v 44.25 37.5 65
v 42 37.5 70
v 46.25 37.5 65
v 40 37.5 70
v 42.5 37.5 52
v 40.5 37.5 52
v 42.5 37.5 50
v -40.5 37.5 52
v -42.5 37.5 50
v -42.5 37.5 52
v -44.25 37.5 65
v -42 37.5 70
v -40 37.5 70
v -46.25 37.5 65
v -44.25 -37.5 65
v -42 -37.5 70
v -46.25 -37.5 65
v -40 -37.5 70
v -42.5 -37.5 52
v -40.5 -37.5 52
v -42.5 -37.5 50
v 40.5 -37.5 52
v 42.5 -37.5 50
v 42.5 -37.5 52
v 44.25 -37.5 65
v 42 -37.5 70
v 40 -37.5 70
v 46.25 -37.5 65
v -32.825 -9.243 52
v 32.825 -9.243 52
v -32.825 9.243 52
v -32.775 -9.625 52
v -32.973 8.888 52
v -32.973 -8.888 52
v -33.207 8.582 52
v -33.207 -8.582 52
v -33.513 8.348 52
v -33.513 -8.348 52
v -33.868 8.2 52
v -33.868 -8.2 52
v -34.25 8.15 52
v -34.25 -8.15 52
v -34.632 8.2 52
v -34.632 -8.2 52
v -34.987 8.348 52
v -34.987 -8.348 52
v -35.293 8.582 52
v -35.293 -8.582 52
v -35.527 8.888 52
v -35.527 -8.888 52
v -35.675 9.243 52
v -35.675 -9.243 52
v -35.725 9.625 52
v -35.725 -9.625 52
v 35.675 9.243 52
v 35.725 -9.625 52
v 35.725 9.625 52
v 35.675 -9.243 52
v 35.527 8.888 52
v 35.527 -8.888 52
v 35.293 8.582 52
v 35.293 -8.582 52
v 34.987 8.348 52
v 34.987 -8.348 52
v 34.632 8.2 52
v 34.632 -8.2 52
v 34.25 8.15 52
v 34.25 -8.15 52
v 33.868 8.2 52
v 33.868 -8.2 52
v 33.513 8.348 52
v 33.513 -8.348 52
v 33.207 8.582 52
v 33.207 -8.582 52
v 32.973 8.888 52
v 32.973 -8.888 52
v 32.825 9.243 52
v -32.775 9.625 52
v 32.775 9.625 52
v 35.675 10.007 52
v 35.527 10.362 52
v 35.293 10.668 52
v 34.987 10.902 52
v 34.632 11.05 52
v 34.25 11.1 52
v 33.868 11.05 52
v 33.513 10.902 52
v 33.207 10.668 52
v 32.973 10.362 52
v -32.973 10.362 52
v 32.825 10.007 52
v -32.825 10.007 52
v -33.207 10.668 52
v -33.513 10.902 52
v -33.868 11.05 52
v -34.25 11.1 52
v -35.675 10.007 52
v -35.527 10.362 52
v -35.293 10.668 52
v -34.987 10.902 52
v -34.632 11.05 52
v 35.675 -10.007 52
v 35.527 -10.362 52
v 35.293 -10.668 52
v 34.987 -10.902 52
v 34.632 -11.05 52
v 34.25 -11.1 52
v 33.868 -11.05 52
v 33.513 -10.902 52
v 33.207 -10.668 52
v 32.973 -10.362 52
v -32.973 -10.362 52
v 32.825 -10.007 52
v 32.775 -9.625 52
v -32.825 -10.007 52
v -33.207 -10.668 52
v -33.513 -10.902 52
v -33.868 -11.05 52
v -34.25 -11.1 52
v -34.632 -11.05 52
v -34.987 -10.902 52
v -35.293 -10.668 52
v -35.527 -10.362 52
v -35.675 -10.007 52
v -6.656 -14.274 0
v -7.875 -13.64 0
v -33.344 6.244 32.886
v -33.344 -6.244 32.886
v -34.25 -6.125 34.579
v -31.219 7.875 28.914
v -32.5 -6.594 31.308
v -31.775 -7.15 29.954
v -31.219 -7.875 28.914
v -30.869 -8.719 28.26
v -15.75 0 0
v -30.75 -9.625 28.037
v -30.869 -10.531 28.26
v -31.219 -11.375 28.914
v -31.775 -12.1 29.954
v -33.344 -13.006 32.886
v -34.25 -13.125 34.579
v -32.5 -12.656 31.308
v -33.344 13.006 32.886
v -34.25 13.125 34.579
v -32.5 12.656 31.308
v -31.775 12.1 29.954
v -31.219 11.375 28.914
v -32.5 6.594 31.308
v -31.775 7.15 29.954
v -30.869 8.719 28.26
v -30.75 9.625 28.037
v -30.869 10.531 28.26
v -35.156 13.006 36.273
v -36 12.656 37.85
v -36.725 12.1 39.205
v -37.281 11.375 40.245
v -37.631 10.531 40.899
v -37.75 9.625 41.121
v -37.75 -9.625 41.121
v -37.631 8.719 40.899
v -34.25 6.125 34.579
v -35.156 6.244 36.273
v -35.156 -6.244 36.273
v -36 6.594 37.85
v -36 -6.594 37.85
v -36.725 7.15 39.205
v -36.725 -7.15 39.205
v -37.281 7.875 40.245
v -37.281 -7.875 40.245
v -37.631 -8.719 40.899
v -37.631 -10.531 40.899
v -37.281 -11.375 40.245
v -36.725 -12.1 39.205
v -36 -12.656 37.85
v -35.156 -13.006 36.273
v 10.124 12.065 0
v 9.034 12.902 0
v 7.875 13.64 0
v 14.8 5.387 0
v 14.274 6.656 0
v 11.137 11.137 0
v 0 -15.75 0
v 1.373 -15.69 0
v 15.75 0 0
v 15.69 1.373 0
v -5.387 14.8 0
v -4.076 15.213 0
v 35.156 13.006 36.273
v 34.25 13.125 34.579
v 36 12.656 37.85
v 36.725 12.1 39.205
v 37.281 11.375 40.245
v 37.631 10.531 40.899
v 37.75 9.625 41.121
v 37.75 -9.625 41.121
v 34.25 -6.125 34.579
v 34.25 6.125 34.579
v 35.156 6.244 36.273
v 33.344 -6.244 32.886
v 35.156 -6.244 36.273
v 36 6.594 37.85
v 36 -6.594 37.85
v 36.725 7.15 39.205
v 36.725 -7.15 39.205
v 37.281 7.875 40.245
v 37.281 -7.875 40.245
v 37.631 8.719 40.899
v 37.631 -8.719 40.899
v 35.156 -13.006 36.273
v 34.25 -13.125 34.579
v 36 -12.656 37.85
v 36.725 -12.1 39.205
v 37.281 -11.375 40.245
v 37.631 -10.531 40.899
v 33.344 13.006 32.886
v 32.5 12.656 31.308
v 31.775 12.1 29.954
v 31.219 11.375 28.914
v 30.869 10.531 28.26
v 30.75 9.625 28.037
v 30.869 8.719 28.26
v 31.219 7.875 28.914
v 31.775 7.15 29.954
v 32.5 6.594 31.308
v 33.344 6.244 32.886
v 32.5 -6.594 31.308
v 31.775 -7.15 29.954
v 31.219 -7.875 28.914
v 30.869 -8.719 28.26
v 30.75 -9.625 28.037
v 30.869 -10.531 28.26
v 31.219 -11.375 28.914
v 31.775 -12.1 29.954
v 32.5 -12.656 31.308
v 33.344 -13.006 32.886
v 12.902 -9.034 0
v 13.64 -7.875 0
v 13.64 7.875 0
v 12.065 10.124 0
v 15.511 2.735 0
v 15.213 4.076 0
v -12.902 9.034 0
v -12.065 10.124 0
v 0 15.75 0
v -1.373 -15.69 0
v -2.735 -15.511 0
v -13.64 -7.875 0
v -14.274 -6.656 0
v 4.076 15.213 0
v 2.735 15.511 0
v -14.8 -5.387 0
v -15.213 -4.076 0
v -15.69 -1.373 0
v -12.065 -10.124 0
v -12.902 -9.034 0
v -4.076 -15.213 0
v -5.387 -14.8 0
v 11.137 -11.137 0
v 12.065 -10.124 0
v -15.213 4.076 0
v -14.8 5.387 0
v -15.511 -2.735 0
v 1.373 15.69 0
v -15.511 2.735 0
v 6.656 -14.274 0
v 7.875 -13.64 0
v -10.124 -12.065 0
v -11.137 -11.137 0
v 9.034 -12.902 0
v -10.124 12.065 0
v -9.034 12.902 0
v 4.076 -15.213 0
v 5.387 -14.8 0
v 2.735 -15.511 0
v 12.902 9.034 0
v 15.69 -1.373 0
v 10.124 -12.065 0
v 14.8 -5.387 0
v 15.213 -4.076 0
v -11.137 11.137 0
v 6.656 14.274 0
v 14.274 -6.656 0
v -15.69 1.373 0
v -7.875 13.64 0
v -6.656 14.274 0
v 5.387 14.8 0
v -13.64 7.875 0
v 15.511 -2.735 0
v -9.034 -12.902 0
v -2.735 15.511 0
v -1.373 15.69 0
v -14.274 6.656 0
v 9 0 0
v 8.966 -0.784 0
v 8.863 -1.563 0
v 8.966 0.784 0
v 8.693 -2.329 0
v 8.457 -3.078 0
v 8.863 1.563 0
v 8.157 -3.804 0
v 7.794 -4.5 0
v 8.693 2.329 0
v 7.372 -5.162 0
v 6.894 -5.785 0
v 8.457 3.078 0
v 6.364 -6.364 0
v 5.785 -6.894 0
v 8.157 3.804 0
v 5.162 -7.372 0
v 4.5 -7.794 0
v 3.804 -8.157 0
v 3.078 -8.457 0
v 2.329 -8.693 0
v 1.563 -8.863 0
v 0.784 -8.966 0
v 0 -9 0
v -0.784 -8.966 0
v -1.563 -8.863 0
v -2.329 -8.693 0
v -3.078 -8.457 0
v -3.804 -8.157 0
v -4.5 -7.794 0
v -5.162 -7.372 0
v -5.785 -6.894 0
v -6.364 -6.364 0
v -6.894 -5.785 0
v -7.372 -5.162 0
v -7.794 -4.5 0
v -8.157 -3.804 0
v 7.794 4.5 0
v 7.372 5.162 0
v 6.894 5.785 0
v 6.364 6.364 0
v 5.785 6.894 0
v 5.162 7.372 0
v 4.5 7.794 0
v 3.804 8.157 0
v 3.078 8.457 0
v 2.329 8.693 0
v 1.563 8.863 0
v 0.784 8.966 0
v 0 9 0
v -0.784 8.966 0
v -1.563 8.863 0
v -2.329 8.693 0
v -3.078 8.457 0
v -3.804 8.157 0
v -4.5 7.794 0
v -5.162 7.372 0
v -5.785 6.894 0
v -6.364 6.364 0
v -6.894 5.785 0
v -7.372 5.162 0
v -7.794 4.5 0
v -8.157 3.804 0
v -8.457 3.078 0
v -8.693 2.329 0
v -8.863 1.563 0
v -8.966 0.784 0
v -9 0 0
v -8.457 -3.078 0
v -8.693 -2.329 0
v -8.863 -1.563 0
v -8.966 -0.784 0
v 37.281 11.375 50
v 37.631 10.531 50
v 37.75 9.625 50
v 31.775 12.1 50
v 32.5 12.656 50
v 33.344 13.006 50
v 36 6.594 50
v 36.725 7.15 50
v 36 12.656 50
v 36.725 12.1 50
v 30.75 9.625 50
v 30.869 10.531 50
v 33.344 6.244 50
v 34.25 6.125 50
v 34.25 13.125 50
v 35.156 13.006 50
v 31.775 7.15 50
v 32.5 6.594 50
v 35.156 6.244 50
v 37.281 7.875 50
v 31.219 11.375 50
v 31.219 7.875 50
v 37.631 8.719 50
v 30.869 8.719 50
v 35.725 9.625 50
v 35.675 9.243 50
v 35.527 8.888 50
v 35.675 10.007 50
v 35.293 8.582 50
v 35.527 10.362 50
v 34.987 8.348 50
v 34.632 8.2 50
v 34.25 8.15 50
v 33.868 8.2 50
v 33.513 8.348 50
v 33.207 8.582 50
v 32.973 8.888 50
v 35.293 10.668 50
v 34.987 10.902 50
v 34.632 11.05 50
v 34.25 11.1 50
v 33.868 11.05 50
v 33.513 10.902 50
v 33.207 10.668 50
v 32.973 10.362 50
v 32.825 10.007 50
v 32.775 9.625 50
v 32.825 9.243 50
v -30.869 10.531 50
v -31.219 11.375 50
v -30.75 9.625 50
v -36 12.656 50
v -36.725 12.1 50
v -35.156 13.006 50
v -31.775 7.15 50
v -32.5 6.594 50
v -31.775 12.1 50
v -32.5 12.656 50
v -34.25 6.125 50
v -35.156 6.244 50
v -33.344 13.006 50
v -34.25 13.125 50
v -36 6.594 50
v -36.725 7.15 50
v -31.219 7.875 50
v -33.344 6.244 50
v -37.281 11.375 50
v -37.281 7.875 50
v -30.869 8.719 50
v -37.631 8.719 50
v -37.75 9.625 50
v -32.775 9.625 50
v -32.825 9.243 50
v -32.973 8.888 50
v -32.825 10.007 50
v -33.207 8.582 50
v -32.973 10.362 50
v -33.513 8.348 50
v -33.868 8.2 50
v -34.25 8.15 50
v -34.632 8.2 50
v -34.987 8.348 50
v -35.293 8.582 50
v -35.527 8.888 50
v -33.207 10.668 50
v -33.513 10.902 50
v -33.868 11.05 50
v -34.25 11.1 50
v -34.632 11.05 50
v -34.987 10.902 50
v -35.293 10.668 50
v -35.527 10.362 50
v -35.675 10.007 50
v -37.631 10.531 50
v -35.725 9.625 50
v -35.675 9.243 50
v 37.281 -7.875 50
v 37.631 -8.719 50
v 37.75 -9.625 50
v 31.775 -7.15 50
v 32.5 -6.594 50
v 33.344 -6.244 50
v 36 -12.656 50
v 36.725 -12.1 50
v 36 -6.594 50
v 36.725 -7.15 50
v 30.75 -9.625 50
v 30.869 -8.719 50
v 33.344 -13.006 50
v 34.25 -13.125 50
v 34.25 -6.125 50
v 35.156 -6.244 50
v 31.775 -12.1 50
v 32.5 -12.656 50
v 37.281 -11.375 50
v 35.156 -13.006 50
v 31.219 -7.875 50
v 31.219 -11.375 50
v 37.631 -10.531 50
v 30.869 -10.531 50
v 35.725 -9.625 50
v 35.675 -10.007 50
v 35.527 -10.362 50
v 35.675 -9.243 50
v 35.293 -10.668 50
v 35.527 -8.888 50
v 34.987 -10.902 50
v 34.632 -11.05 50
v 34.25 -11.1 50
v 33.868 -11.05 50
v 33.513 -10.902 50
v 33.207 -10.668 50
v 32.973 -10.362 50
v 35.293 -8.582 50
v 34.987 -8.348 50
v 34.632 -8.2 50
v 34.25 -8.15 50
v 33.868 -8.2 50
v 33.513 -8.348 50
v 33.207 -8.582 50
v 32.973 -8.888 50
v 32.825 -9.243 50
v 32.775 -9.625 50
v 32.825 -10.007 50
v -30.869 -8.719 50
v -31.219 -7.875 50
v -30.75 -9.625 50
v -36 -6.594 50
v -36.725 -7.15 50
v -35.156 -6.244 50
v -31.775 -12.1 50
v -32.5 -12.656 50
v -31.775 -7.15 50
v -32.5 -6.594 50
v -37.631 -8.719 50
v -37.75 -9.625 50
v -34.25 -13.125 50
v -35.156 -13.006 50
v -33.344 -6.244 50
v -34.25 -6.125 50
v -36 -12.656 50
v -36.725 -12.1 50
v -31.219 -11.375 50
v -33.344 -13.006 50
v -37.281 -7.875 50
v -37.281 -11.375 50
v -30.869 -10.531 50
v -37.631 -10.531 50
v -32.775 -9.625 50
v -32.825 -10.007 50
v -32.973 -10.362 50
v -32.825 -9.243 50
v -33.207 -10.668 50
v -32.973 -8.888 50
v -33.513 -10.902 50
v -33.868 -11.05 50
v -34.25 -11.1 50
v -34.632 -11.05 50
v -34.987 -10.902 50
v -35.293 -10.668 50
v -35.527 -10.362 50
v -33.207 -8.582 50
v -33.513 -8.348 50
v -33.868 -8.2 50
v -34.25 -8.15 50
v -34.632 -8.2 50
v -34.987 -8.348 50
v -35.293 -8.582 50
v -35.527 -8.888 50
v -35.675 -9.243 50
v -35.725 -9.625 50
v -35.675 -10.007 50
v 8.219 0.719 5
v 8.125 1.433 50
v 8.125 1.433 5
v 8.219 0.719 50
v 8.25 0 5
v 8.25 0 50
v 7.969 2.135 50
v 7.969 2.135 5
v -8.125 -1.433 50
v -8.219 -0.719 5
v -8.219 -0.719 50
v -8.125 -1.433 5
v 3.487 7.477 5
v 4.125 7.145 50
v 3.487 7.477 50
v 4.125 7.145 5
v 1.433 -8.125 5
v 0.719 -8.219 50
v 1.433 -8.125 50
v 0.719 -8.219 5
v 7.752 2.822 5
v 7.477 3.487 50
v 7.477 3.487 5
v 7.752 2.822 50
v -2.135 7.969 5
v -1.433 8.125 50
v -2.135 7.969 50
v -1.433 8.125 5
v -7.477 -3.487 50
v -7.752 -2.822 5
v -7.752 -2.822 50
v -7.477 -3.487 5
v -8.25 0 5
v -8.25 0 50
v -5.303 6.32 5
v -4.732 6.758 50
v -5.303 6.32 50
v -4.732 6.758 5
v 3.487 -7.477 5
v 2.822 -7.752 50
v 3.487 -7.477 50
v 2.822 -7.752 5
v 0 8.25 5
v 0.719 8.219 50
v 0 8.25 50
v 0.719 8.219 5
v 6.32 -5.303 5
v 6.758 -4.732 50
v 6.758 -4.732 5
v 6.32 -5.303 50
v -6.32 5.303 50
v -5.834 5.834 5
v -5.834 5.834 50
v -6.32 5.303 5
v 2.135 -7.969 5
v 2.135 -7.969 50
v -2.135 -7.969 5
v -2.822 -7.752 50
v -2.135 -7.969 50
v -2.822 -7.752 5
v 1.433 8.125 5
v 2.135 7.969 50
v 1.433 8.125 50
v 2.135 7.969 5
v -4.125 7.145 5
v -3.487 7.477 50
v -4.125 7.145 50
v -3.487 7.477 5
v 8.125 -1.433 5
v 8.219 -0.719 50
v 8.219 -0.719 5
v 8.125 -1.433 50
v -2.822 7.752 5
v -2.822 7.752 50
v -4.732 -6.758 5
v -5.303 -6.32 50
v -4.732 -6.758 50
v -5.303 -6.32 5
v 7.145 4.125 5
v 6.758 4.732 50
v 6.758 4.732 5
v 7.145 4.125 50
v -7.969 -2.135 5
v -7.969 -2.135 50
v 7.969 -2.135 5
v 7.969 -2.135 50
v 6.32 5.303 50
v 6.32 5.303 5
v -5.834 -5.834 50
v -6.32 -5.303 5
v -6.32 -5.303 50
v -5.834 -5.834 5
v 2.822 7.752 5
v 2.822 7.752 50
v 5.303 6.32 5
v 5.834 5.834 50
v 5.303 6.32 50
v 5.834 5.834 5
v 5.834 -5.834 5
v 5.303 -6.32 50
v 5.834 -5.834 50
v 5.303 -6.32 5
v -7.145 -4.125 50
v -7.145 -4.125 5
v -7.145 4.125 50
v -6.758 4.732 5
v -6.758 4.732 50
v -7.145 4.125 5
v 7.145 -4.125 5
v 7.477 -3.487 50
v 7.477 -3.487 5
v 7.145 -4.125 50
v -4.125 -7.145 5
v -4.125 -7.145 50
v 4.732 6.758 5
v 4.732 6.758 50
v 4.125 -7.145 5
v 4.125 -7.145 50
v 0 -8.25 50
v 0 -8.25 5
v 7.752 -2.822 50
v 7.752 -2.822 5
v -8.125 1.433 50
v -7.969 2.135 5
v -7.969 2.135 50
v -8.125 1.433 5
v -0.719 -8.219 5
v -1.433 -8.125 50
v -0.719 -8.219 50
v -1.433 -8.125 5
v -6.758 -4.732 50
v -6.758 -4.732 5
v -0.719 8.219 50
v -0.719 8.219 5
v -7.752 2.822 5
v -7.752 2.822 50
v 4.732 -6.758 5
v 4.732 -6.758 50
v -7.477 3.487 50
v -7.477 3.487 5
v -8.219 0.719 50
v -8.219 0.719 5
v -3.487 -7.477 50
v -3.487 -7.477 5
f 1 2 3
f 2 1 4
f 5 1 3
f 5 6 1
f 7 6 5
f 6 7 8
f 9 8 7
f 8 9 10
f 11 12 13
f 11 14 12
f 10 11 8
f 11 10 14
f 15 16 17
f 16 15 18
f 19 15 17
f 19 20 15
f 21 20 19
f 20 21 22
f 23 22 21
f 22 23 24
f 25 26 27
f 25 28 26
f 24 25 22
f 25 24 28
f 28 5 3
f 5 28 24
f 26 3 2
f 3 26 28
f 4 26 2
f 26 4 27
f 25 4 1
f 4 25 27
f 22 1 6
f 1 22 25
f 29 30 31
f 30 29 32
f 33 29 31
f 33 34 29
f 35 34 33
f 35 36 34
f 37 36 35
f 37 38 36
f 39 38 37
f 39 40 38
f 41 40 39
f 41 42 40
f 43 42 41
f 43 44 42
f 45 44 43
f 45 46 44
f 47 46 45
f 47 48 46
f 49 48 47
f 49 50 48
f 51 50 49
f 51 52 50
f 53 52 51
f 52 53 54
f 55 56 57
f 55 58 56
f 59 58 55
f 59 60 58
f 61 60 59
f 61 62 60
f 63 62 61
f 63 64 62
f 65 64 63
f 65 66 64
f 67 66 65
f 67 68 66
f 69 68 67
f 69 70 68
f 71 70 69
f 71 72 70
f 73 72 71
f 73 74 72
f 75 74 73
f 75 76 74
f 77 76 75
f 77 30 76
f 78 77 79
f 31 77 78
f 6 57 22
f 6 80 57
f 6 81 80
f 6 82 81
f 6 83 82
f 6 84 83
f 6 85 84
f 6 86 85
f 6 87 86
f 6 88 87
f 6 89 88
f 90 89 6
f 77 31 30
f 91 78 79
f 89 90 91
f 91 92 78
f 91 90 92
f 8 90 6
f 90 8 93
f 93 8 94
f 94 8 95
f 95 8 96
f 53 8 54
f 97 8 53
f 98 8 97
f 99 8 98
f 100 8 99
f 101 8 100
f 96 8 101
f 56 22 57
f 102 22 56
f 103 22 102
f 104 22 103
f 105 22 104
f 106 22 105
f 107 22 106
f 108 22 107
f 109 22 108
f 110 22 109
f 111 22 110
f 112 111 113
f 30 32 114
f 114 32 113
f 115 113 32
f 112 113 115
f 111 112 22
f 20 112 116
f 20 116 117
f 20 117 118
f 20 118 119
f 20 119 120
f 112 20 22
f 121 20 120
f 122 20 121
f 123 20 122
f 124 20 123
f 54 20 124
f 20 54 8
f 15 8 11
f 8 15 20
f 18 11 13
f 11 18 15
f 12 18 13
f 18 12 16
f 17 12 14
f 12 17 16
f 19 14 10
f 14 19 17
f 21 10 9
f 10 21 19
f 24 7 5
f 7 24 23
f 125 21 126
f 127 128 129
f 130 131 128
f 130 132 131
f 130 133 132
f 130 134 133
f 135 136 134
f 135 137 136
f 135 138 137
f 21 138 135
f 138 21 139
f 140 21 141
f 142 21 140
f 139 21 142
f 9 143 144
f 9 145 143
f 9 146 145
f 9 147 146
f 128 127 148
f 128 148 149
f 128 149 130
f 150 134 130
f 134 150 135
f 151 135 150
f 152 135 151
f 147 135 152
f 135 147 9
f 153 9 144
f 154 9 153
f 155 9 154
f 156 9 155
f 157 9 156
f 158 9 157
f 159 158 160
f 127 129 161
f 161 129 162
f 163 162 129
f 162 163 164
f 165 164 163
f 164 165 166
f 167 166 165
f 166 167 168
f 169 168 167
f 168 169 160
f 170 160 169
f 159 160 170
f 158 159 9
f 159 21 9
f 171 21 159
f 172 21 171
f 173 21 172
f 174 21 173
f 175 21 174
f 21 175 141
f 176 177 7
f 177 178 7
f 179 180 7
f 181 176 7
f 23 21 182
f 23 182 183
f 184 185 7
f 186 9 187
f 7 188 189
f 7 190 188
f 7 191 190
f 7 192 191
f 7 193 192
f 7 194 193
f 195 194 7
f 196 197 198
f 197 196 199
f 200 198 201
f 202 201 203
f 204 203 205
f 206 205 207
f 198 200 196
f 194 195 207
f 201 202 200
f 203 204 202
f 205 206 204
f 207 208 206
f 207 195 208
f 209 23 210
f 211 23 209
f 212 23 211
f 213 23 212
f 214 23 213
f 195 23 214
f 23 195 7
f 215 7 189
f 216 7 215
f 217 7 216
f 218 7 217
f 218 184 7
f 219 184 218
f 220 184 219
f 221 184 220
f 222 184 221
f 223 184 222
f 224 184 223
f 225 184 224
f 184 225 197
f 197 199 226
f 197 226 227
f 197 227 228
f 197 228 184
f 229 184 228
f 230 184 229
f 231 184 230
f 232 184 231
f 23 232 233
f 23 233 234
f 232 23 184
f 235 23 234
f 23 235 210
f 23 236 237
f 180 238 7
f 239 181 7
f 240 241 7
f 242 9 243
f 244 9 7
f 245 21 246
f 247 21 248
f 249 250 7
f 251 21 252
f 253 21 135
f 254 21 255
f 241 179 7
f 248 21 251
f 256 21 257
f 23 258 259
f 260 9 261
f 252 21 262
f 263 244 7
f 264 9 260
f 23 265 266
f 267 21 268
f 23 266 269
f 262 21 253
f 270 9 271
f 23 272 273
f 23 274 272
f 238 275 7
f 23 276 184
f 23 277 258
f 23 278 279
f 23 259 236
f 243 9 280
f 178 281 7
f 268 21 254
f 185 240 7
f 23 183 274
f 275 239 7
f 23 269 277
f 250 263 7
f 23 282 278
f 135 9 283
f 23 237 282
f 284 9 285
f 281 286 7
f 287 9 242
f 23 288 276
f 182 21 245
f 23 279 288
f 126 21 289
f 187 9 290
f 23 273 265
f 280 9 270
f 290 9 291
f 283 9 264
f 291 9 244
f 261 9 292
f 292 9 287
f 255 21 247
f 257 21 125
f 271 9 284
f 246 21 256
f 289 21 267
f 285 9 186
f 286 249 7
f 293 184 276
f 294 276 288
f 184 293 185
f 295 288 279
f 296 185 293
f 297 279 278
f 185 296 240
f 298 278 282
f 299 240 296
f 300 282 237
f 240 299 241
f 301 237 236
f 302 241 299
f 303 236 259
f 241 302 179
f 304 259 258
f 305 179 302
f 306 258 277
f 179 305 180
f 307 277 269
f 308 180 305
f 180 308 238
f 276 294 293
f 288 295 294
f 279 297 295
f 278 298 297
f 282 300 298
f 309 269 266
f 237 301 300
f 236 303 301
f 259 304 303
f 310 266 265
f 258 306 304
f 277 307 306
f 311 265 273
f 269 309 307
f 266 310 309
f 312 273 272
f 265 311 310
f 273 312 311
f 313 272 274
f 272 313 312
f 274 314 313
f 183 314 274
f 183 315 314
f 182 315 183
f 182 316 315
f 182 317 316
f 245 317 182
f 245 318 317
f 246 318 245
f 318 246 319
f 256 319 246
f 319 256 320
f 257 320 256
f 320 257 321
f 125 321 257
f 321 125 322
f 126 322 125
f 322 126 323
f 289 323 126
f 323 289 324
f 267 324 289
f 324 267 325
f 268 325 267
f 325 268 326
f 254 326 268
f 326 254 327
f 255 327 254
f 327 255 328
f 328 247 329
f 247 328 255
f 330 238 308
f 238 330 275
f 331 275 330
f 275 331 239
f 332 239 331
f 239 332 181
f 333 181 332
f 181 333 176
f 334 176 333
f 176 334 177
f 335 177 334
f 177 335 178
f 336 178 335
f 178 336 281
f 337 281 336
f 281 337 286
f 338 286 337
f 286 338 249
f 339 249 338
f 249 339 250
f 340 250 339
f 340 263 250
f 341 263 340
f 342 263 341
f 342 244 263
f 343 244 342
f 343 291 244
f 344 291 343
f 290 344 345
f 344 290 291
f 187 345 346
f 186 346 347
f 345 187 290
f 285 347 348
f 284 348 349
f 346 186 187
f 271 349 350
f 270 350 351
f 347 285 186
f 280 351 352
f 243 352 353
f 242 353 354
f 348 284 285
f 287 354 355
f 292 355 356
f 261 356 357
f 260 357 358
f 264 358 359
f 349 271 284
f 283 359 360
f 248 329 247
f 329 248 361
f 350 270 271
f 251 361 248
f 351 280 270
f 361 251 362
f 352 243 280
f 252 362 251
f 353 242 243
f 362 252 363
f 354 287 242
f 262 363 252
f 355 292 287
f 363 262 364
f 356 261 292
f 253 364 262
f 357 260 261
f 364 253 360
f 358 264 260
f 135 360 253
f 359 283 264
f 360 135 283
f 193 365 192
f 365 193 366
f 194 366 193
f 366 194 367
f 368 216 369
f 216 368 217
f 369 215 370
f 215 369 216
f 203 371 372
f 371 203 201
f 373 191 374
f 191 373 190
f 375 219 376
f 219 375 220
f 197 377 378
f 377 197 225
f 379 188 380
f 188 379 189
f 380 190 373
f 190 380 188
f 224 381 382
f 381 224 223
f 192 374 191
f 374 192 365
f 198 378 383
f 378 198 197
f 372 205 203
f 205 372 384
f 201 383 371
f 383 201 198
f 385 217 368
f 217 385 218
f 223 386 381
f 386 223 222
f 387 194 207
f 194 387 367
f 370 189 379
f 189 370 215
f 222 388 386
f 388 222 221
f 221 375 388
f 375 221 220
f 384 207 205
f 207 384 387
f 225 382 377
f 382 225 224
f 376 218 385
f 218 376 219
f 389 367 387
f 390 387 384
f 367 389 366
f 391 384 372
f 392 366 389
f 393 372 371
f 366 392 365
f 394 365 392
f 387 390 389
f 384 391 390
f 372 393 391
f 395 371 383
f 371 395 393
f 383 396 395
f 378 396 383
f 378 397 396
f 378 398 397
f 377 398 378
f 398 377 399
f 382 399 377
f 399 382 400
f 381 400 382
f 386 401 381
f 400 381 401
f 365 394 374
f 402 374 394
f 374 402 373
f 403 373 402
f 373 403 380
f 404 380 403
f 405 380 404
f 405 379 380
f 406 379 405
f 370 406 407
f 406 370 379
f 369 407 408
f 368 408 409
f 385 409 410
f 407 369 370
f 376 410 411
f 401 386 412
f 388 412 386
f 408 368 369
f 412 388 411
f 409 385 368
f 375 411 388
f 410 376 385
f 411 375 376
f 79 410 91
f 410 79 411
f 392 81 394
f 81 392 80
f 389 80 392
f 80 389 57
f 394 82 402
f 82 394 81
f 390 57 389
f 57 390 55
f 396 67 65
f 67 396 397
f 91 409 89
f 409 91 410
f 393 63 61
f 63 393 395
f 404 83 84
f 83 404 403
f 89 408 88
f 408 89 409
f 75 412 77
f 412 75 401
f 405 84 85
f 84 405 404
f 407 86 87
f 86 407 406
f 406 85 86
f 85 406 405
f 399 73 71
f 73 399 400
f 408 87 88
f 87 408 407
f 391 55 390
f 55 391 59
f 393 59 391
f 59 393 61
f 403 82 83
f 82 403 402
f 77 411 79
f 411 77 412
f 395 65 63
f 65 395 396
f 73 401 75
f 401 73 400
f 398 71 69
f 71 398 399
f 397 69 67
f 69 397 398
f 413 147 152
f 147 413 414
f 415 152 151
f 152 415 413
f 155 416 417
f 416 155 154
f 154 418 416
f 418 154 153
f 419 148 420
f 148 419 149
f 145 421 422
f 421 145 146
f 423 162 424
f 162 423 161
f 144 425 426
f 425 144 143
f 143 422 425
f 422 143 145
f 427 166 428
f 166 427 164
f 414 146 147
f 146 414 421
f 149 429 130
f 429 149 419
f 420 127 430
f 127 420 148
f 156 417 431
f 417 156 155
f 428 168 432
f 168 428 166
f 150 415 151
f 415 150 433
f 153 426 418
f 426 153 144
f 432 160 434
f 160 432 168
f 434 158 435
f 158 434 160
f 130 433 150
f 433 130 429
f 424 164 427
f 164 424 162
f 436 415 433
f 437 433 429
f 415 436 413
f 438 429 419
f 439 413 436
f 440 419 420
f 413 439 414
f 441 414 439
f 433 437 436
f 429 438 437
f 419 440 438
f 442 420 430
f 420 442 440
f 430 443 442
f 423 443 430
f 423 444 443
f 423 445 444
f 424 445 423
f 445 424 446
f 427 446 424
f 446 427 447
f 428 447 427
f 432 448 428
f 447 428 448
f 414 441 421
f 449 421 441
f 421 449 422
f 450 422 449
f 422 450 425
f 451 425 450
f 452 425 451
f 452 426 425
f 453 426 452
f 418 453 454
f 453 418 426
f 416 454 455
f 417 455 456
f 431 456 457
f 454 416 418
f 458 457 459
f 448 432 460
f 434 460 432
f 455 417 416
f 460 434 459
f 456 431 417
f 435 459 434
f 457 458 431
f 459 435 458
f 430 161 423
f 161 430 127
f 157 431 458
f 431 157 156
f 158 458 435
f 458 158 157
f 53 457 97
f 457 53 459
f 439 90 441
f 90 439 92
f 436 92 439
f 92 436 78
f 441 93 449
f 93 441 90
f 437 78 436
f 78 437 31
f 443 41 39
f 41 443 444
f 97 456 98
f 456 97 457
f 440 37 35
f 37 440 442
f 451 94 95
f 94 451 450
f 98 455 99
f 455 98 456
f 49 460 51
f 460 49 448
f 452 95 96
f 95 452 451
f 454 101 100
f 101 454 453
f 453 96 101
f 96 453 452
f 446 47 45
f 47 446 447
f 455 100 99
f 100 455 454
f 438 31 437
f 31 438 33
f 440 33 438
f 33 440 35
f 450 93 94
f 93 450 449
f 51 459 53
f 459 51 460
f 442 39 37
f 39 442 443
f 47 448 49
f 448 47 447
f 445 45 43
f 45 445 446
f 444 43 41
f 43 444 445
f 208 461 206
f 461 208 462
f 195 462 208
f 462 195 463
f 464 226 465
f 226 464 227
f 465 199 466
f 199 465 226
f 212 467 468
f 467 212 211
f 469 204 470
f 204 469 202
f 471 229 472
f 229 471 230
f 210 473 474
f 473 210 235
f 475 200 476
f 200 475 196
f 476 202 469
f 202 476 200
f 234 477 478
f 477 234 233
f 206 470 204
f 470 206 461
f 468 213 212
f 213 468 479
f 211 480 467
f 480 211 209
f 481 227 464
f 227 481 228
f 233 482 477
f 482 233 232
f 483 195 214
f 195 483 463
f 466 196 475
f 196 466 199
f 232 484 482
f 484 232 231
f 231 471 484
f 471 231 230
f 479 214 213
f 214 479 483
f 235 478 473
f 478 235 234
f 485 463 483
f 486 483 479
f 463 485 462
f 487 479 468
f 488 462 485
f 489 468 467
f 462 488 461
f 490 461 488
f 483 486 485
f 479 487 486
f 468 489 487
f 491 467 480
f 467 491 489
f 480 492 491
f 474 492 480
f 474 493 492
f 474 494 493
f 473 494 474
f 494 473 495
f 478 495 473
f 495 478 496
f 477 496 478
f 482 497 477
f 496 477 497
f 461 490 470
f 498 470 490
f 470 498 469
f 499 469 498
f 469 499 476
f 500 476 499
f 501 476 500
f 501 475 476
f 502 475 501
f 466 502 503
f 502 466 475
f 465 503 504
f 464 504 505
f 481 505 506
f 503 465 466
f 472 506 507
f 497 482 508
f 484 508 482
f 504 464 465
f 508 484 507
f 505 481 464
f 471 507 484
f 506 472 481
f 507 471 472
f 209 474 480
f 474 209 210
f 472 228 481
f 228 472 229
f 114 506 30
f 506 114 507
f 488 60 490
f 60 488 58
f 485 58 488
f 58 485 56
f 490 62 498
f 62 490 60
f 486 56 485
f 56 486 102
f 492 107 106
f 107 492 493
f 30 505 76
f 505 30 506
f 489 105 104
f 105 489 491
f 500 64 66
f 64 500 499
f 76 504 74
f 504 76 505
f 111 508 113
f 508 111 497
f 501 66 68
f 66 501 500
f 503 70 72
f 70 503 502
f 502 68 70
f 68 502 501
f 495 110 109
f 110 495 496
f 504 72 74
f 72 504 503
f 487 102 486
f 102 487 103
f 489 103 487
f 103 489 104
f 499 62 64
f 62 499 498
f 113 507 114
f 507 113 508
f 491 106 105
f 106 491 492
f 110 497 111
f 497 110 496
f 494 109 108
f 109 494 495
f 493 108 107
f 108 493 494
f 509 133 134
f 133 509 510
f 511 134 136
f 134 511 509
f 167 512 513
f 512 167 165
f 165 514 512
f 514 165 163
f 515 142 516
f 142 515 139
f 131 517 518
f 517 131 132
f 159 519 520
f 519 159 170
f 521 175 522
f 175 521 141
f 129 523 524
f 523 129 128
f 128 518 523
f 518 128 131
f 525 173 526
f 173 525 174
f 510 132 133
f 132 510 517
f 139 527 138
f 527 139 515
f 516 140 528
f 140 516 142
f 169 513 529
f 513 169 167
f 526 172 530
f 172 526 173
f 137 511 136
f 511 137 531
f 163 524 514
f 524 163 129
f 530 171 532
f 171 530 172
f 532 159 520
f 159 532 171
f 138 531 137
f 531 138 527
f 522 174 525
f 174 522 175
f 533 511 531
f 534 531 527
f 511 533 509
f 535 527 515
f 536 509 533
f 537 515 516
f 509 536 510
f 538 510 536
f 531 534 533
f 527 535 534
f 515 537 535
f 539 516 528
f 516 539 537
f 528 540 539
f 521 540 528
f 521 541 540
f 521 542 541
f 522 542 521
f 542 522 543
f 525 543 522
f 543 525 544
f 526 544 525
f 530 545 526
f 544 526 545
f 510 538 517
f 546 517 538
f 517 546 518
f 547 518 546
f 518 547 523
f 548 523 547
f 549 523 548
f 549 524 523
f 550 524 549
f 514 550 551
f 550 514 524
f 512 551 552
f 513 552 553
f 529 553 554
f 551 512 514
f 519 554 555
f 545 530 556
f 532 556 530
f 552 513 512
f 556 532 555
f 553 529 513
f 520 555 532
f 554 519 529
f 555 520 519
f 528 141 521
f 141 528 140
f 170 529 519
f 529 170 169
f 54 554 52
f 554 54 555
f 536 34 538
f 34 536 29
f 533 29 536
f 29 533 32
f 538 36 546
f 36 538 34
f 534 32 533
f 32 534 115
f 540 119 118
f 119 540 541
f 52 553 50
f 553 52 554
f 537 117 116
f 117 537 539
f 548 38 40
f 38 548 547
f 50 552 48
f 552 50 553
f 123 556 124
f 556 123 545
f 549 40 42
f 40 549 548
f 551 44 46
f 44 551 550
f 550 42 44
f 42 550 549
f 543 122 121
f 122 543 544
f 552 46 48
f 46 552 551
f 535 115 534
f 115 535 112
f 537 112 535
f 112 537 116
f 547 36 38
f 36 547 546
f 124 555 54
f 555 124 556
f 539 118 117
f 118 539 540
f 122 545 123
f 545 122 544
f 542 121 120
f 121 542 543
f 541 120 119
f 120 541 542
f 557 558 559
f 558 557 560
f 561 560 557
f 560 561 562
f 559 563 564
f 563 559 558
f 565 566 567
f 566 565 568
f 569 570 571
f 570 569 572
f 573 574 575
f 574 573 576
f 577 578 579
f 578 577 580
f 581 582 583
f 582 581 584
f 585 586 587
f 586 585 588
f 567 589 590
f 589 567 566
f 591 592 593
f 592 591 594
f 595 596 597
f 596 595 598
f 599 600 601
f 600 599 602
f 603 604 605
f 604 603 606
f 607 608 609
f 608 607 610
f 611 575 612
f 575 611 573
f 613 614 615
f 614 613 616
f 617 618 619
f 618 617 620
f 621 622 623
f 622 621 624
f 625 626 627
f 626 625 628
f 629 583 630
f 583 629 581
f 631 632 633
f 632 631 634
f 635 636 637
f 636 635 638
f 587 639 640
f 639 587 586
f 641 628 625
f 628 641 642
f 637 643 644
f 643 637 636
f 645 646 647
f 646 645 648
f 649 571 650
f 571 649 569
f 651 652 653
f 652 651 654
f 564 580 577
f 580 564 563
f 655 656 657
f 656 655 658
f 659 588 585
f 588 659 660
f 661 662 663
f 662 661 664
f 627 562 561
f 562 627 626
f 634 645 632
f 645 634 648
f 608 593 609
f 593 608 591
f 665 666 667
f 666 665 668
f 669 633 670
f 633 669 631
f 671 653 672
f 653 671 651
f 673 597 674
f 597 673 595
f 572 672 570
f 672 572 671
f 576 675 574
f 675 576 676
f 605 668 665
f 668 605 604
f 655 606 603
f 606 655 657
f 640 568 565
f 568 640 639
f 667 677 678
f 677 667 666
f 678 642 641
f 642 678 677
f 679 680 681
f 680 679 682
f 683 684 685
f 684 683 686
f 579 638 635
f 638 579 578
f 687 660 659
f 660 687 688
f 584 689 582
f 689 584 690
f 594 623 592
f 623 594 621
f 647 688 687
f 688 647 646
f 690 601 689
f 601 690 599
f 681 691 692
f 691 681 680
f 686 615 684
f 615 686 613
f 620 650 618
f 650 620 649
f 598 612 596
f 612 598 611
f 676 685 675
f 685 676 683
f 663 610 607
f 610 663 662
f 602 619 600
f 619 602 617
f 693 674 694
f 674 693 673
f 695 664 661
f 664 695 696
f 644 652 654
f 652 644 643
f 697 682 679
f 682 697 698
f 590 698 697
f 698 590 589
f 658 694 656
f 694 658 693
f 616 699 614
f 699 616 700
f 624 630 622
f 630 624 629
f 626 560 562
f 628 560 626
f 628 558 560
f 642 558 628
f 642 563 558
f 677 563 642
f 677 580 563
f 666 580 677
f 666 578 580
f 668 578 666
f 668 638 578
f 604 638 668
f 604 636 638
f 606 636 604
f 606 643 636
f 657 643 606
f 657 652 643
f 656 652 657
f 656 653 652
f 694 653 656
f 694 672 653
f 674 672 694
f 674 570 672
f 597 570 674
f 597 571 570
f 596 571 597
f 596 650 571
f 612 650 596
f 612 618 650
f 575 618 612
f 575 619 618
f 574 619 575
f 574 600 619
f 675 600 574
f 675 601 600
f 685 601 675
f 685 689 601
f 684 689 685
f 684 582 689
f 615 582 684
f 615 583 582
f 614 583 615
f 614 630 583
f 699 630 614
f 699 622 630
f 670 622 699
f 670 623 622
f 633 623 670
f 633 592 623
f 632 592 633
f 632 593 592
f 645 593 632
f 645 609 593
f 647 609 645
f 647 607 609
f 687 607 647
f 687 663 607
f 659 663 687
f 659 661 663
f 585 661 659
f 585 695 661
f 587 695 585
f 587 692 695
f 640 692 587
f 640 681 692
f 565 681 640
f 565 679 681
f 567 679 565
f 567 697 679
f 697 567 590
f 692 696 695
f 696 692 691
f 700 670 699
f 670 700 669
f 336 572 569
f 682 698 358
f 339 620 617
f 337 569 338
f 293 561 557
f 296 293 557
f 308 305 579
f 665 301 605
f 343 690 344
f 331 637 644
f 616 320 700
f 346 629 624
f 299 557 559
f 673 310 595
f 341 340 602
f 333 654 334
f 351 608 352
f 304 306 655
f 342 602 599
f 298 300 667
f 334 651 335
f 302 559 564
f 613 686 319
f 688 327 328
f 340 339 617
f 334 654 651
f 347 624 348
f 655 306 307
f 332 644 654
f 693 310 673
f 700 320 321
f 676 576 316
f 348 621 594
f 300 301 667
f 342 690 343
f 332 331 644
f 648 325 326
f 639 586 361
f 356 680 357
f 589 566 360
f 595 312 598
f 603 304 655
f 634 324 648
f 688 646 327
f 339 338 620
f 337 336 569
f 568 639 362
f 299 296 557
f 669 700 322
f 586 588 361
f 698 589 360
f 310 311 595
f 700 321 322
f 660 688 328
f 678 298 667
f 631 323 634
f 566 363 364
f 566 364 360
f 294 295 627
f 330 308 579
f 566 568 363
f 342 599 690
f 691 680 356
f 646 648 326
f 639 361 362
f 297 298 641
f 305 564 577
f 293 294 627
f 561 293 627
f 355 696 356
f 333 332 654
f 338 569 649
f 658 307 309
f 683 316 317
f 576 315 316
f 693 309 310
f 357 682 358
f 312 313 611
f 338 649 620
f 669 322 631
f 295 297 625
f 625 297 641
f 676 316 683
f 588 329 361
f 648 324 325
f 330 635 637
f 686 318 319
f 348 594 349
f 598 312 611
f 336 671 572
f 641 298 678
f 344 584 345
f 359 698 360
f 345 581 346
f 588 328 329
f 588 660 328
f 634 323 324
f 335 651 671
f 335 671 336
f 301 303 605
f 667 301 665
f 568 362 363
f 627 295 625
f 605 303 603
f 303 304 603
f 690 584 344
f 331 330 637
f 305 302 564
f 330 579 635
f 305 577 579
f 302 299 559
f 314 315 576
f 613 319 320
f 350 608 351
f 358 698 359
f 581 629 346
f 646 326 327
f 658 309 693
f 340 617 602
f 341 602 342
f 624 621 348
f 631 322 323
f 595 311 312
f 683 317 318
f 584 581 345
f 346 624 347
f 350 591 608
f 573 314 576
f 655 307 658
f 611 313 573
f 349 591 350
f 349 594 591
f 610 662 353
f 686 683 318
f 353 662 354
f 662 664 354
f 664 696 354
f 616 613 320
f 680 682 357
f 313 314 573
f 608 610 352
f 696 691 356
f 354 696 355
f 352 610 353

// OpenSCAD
// file: measurements.scad
// The thickness of any walls (e.g. the difference between the inner and outer radiuses of a tube retainer).
thickness_mm = 7.5;

// The tube which spaces apart the VESA mount and the Kinect mount.
////////////////////////////////////////////////////////////////////////////////

// The diameter of the narrowest part of the tube's retainer.
tube_retainer_diameter_mm = 16.5;

// The total length of the tube's retainer.
tube_retainer_length_mm = 50;

// The diameter of the widest part of the tube's retainer.
tube_feed_diameter_mm = 18;

// The length of the transition between the widest and narrowest parts of the
// tube's retainer.
tube_feed_length_mm = 5;

// The number of sides on the tube's retainer.
tube_sides = 72;

// Additional radius added where a tube mounting meets a surface.
tube_widening_mm = 10;

// Kinect for Xbox 360.
////////////////////////////////////////////////////////////////////////////////

// The length of the Kinect's base.
kinect_length_mm = 75;

// The width of the bottom of the Kinect's base.
kinect_lower_width_mm = 81;

// The thickness of the base below the Kinect.
kinect_base_height_mm = 2;

// The width of the middle of the Kinect's base (its widest point).
kinect_middle_width_mm = 88.5;

// The distance between the bottom of the Kinect's base and its widest point.
kinect_lower_height_mm = 13;

// The width of the top of the Kinect's base.
kinect_top_width_mm = 80;

// The distance between the widest point of the Kinect's base and the top of the
// retainer.
kinect_upper_height_mm = 5;

// The thickness of the Kinect's retainer.
kinect_clip_thickness_mm = 2;

// The diameter of the head of the M3 screw used to secure the Kinect.
kinect_screw_head_diameter_mm = 7;

// The diameter of the hole required by the M3 screw used to secure the Kinect.
kinect_screw_hole_diameter_mm = 2.95;

// The number of sides of the head of or the hole required by the M3 screw used
// to secure the Kinect.
kinect_screw_sides = 24;

// The distance between the Kinect's front and back screw holes.
kinect_screw_y_spacing_mm = 19.25;

// The distance between the Kinect's left and right screw holes.
kinect_screw_x_spacing_mm = 68.5;

// The space which must be clear behind a Kinect for cable routing.
kinect_cable_spacing_mm = 15;

// The MALM push-fit bracket.
////////////////////////////////////////////////////////////////////////////////

// The thickness of the desk.
malm_height_mm = 50.5;

// The length of the fingers which push onto the desk.  Increase to improve
// pitch stability.
malm_length_mm = 70;

// The width of the fingers which push onto the desk.  Increase to improve roll
// stability.
malm_width_mm = 60;
// main file
include <measurements.scad>

difference() {
    union() {
        translate([0, kinect_length_mm / 2, tube_retainer_length_mm]) {
            rotate([90, 0, 0]) {
                linear_extrude(kinect_length_mm) {
                    polygon([
                        [kinect_lower_width_mm / 2, kinect_base_height_mm],
                        [kinect_middle_width_mm / 2, kinect_base_height_mm + kinect_lower_height_mm],
                        [kinect_top_width_mm / 2, kinect_base_height_mm + kinect_lower_height_mm + kinect_upper_height_mm],
                        [kinect_top_width_mm / 2 + kinect_clip_thickness_mm, kinect_base_height_mm + kinect_lower_height_mm + kinect_upper_height_mm],
                        [kinect_middle_width_mm / 2 + kinect_clip_thickness_mm, kinect_base_height_mm + kinect_lower_height_mm],
                        [kinect_lower_width_mm / 2 + kinect_clip_thickness_mm, kinect_base_height_mm],
                        [kinect_lower_width_mm / 2 + kinect_clip_thickness_mm, 0],
                        [kinect_lower_width_mm / -2 - kinect_clip_thickness_mm, 0],
                        [kinect_lower_width_mm / -2 - kinect_clip_thickness_mm, kinect_base_height_mm],
                        [kinect_middle_width_mm / -2 - kinect_clip_thickness_mm, kinect_base_height_mm + kinect_lower_height_mm],
                        [kinect_top_width_mm / -2 - kinect_clip_thickness_mm, kinect_base_height_mm + kinect_lower_height_mm + kinect_upper_height_mm],
                        [kinect_top_width_mm / -2, kinect_base_height_mm + kinect_lower_height_mm + kinect_upper_height_mm],
                        [kinect_middle_width_mm / -2, kinect_base_height_mm + kinect_lower_height_mm],
                        [kinect_lower_width_mm / -2, kinect_base_height_mm],
                    ]);
                };
            };
        };

        hull() {
            cylinder(
                d = tube_retainer_diameter_mm + thickness_mm * 2,
                h = tube_retainer_length_mm,
                $fn = tube_sides
            );

            translate([
                kinect_lower_width_mm / -2 - kinect_clip_thickness_mm,
                kinect_length_mm / -2,
                tube_retainer_length_mm,
            ]) {
                cube([
                    kinect_lower_width_mm + kinect_clip_thickness_mm * 2,
                    kinect_length_mm,
                    kinect_clip_thickness_mm,
                ]);
            };
        };
    };

    translate([kinect_screw_x_spacing_mm / 2, kinect_screw_y_spacing_mm / 2, 0]) {
        cylinder(d = kinect_screw_head_diameter_mm, $fn = kinect_screw_sides, h = tube_retainer_length_mm);
        cylinder(d = kinect_screw_hole_diameter_mm, $fn = kinect_screw_sides, h = tube_retainer_length_mm + kinect_clip_thickness_mm);
    };

    translate([kinect_screw_x_spacing_mm / -2, kinect_screw_y_spacing_mm / 2, 0]) {
        cylinder(d = kinect_screw_head_diameter_mm, $fn = kinect_screw_sides, h = tube_retainer_length_mm);
        cylinder(d = kinect_screw_hole_diameter_mm, $fn = kinect_screw_sides, h = tube_retainer_length_mm + kinect_clip_thickness_mm);
    };

    translate([kinect_screw_x_spacing_mm / 2, kinect_screw_y_spacing_mm / -2, 0]) {
        cylinder(d = kinect_screw_head_diameter_mm, $fn = kinect_screw_sides, h = tube_retainer_length_mm);
        cylinder(d = kinect_screw_hole_diameter_mm, $fn = kinect_screw_sides, h = tube_retainer_length_mm + kinect_clip_thickness_mm);
    };

    translate([kinect_screw_x_spacing_mm / -2, kinect_screw_y_spacing_mm / -2, 0]) {
        cylinder(d = kinect_screw_head_diameter_mm, $fn = kinect_screw_sides, h = tube_retainer_length_mm);
        cylinder(d = kinect_screw_hole_diameter_mm, $fn = kinect_screw_sides, h = tube_retainer_length_mm + kinect_clip_thickness_mm);
    };

    cylinder(
        d = tube_retainer_diameter_mm,
        h = tube_retainer_length_mm,
        $fn = tube_sides
    );

    cylinder(
        d1 = tube_feed_diameter_mm,
        d2 = tube_retainer_diameter_mm,
        h = tube_feed_length_mm,
        $fn = tube_sides
    );
};
